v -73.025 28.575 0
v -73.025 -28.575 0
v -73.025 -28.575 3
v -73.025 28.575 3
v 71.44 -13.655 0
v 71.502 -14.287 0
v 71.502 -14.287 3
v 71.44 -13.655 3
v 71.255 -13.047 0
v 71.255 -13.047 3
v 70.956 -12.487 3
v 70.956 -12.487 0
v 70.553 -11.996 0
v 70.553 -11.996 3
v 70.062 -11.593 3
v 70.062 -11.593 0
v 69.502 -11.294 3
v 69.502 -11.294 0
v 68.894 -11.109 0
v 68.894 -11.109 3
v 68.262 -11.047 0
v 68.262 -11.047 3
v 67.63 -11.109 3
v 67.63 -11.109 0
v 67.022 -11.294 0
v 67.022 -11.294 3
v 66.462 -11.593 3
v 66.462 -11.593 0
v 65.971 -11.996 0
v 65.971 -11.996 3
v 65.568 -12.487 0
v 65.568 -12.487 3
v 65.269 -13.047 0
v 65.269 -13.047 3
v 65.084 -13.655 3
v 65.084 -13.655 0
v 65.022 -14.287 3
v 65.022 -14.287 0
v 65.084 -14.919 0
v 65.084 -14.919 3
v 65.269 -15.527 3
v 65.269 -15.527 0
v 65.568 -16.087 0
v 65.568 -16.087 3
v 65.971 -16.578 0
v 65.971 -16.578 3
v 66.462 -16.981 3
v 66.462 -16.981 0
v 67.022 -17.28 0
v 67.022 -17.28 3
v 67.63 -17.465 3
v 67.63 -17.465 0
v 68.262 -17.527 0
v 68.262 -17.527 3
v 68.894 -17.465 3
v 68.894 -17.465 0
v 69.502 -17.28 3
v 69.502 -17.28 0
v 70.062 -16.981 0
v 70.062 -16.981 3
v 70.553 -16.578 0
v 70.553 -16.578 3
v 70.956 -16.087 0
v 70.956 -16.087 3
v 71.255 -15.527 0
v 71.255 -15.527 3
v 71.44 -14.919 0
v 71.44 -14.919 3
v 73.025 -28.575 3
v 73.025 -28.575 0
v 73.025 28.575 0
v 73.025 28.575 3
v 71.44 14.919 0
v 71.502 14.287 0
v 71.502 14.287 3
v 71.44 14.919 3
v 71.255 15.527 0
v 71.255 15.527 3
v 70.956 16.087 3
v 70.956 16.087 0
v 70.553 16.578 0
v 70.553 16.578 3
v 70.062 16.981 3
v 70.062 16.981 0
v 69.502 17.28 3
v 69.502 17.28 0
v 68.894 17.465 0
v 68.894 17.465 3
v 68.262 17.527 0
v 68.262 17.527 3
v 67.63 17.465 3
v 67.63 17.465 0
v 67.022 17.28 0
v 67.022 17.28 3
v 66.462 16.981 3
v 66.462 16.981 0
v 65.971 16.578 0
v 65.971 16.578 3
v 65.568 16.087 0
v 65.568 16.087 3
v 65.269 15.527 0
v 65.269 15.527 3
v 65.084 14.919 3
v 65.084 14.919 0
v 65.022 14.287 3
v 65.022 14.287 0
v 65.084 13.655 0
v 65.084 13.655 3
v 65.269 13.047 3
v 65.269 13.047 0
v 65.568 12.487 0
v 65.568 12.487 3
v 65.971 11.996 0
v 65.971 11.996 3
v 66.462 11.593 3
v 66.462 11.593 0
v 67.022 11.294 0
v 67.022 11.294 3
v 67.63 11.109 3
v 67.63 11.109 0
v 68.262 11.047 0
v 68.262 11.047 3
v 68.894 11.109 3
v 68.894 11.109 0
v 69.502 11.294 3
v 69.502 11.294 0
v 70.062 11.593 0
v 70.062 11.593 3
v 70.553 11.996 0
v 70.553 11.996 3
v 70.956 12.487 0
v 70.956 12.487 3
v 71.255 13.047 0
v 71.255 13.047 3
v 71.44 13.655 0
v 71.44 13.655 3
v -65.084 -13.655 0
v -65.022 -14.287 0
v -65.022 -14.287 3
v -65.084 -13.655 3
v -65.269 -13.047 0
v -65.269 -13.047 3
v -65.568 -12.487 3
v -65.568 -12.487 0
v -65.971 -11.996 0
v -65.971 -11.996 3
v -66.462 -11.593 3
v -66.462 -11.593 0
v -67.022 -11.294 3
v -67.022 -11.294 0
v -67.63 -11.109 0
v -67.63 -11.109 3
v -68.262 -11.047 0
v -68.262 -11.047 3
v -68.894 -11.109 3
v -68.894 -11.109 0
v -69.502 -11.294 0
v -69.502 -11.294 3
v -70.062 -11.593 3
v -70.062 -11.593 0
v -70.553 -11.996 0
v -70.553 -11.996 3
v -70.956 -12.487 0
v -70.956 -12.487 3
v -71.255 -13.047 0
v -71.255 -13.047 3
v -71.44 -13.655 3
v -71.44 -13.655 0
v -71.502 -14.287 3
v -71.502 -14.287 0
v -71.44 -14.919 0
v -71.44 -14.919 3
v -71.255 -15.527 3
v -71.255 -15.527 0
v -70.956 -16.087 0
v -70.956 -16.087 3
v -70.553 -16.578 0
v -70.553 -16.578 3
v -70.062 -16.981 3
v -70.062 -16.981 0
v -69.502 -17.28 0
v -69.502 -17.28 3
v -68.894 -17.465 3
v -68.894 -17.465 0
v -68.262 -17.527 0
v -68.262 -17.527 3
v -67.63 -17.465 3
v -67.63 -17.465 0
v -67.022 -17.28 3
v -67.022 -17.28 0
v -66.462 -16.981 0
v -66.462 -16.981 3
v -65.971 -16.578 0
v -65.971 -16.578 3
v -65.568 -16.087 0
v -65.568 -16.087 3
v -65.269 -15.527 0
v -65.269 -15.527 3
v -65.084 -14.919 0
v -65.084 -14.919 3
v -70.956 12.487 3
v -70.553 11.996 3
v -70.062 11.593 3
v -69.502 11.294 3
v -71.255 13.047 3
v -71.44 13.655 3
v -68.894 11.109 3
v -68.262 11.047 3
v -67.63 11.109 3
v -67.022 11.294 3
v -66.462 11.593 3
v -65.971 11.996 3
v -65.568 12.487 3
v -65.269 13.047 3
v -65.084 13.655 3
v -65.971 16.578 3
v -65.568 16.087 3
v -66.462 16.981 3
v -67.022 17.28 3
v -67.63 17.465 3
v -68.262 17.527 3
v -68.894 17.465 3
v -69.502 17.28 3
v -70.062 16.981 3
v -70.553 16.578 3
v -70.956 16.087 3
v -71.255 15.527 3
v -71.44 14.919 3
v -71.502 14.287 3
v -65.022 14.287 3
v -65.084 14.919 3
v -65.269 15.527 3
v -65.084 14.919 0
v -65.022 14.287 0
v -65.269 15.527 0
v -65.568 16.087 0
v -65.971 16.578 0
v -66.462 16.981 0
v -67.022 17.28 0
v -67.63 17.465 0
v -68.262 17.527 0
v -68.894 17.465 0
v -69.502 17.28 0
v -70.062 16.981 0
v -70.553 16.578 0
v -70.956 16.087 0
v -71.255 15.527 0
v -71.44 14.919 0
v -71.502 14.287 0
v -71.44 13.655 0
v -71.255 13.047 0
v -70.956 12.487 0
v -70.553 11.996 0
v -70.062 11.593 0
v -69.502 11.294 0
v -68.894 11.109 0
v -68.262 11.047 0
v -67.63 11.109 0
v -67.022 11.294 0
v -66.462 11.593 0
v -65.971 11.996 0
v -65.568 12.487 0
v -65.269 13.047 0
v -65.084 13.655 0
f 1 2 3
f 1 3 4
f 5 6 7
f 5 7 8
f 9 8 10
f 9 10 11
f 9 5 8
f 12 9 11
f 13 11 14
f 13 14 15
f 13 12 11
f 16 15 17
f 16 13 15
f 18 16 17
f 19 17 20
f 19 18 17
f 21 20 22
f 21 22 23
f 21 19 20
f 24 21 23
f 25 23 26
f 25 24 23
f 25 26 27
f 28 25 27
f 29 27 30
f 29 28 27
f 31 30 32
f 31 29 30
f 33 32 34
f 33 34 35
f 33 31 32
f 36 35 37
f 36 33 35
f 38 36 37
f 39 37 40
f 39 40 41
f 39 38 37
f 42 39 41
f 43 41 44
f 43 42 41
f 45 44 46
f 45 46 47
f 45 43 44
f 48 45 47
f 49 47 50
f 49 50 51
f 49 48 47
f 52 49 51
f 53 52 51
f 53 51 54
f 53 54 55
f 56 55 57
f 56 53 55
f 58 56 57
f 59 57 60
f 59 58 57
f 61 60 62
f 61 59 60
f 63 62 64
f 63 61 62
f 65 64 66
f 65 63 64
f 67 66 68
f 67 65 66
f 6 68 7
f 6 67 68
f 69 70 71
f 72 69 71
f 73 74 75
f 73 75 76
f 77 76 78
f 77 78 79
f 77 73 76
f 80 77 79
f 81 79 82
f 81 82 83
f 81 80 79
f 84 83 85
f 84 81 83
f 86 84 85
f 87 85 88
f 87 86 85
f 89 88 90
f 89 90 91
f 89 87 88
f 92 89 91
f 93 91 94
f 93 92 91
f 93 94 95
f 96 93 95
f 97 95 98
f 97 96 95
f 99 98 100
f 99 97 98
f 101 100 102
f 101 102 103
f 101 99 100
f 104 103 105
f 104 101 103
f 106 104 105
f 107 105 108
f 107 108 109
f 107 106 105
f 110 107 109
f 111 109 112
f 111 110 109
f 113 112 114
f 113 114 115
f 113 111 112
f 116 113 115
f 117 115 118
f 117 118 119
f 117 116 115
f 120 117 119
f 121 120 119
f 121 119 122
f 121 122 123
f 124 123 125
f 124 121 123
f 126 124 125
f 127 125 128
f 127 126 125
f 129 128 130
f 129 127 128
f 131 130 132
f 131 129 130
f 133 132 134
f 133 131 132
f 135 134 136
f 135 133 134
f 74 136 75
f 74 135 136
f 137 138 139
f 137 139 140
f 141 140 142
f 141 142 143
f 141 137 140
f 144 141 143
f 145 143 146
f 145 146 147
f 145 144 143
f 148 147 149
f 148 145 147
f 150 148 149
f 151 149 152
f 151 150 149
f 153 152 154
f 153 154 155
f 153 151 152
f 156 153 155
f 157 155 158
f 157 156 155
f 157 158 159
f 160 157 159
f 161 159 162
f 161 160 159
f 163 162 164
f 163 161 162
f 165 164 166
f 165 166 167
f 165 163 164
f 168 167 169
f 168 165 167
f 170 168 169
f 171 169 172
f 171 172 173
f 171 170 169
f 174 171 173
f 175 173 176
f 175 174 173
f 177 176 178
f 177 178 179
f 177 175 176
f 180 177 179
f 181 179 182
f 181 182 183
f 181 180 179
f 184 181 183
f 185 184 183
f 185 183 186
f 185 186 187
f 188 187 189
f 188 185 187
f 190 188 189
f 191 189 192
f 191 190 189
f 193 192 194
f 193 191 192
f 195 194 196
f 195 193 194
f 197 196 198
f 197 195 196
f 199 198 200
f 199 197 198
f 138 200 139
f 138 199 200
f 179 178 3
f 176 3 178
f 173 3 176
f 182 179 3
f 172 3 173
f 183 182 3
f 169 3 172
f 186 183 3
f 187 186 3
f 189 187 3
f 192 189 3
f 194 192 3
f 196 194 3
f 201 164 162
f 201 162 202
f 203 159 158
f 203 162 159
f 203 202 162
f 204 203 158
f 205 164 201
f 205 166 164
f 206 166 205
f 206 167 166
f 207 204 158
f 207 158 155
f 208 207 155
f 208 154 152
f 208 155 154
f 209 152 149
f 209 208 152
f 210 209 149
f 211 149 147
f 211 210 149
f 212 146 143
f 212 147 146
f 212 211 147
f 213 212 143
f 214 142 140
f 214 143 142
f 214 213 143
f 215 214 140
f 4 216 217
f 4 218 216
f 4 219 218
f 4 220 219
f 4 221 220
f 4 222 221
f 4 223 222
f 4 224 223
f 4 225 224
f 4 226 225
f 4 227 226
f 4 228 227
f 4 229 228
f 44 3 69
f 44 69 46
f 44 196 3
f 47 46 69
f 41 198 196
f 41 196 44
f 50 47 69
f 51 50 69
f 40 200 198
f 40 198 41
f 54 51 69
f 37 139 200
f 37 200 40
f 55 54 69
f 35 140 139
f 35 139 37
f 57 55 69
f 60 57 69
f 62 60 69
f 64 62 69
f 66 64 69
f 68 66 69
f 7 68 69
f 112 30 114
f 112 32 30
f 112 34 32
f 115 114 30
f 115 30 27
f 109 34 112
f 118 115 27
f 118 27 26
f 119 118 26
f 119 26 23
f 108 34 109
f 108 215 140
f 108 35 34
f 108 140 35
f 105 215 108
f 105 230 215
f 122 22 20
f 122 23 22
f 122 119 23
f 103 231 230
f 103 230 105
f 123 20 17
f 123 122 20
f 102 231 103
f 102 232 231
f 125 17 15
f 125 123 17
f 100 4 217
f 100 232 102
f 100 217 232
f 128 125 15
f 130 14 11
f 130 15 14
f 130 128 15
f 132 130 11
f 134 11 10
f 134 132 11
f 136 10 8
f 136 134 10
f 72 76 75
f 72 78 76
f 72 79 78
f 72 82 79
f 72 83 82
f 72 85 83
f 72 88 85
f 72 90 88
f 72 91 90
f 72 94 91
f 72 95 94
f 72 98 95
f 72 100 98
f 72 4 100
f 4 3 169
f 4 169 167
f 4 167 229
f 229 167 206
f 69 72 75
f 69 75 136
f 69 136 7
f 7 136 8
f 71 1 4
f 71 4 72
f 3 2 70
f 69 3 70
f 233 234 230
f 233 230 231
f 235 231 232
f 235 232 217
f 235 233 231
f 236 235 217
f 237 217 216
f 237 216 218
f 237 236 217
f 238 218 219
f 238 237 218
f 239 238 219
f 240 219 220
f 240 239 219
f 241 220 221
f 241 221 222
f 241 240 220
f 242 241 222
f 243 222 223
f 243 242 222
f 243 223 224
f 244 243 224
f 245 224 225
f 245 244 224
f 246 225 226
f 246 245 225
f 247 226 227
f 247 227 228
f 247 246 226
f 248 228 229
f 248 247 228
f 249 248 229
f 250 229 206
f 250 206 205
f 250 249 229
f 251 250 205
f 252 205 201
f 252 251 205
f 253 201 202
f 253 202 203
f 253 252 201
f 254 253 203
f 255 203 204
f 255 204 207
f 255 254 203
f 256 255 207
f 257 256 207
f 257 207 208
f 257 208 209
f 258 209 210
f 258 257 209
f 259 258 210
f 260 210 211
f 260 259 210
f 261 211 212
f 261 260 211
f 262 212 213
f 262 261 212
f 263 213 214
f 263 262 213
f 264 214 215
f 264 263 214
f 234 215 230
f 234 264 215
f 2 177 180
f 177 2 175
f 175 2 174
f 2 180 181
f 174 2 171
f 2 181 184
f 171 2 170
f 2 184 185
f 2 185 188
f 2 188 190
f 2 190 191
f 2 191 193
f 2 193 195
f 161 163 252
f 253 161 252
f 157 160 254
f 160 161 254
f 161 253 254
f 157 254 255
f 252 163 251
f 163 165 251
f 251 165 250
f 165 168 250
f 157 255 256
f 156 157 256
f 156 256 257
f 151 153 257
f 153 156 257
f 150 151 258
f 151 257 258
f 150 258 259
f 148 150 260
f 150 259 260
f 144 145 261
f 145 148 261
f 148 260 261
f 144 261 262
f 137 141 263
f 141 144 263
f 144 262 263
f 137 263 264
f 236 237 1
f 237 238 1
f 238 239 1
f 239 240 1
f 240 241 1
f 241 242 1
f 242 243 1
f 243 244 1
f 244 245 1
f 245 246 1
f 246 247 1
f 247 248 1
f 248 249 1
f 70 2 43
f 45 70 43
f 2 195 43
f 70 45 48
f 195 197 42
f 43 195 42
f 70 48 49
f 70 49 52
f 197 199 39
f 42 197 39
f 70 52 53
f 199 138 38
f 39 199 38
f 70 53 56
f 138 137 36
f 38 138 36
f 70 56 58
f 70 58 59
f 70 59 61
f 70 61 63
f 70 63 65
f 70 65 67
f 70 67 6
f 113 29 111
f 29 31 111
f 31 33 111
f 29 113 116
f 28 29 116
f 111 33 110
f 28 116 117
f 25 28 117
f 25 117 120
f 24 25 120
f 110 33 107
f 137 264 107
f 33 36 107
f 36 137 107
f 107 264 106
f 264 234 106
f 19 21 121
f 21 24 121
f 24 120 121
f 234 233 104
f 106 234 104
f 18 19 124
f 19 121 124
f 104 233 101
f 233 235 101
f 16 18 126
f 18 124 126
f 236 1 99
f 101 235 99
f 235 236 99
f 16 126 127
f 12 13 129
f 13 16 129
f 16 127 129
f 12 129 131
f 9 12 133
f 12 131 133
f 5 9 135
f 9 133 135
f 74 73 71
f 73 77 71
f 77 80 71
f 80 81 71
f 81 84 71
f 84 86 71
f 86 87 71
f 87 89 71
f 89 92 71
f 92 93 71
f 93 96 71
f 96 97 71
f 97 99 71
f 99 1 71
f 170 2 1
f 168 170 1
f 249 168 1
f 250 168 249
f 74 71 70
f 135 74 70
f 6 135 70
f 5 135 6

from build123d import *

# Parameters (mm, degrees)
F0_W     = 146.05
F0_H     = 57.15
F0_R     = 3.24
F1_DEPTH = 3


# Not quite as in the source:
# - ends of sketch curves that miss each other by under 0.0002 mm in the source are joined


with BuildPart() as f1:
    # F0 (on Top) → F1 (new body)
    with BuildSketch(Plane.XY):
        Rectangle(F0_W, F0_H)
        with Locations((-68.262, -14.287)):
            Circle(F0_R, mode=Mode.SUBTRACT)
        with Locations((68.262, -14.287)):
            Circle(F0_R, mode=Mode.SUBTRACT)
        with Locations((-68.262, 14.287)):
            Circle(F0_R, mode=Mode.SUBTRACT)
        with BuildLine():
            ThreePointArc((-68.262, 7.937), (-61.912, 14.287), (-68.262, 20.637))
            Line((-68.262, 20.637), (-72.225, 20.637))
            Line((-72.225, 20.637), (-72.225, 27.775))
            Line((-72.225, 27.775), (72.225, 27.775))
            Line((72.225, 27.775), (72.225, 20.636958))
            Line((72.225, 20.636958), (69.238962, 20.636958))
            ThreePointArc((69.238962, 20.636958), (62.9120417914, 14.2639619992), (69.2850380008, 7.9370417914))
            Line((69.2850380008, 7.9370417914), (72.225, 7.937042))
            Line((72.225, 7.937042), (72.225, -7.937576))
            Line((72.225, -7.937576), (68.176478, -7.937576))
            ThreePointArc((68.176478, -7.937576), (61.9125759326, -14.3725220009), (68.3475220009, -20.6364240674))
            Line((68.3475220009, -20.6364240674), (72.225, -20.636424))
            Line((72.225, -20.636424), (72.225, -27.775))
            Line((72.225, -27.775), (-72.225, -27.775))
            Line((-72.225, -27.775), (-72.225, -20.636871))
            Line((-72.225, -20.636871), (-69.221508, -20.636871))
            ThreePointArc((-69.221508, -20.636871), (-62.9121291038, -14.2465080007), (-69.3024919993, -7.9371291038))
            Line((-69.3024919993, -7.9371291038), (-72.225, -7.937129))
            Line((-72.225, -7.937129), (-72.225, 7.937))
            Line((-72.225, 7.937), (-68.262, 7.937))
        make_face(mode=Mode.SUBTRACT)
        with Locations((68.262, 14.287)):
            Circle(F0_R, mode=Mode.SUBTRACT)
        with BuildLine():
            Line((-72.225, 20.637), (-68.262, 20.637))
            ThreePointArc((-68.262, 20.637), (-61.912, 14.287), (-68.262, 7.937))
            Line((-68.262, 7.937), (-72.225, 7.937))
            Line((-72.225, 7.937), (-72.225, -7.937129))
            Line((-72.225, -7.937129), (-69.302492, -7.937129))
            ThreePointArc((-69.302492, -7.937129), (-62.9121291038, -14.2465080007), (-69.2215080007, -20.6368708962))
            Line((-69.2215080007, -20.6368708962), (-72.225, -20.636871))
            Line((-72.225, -20.636871), (-72.225, -27.775))
            Line((-72.225, -27.775), (72.225, -27.775))
            Line((72.225, -27.775), (72.225, -20.636424))
            Line((72.225, -20.636424), (68.347522, -20.636424))
            ThreePointArc((68.347522, -20.636424), (61.9125759326, -14.3725220009), (68.1764779991, -7.9375759326))
            Line((68.1764779991, -7.9375759326), (72.225, -7.937576))
            Line((72.225, -7.937576), (72.225, 7.937042))
            Line((72.225, 7.937042), (69.285038, 7.937042))
            ThreePointArc((69.285038, 7.937042), (62.9120417914, 14.2639619992), (69.2389619992, 20.6369582086))
            Line((69.2389619992, 20.6369582086), (72.225, 20.636958))
            Line((72.225, 20.636958), (72.225, 27.775))
            Line((72.225, 27.775), (-72.225, 27.775))
            Line((-72.225, 27.775), (-72.225, 20.637))
        make_face()
    extrude(amount=F1_DEPTH)


solid = f1.part
